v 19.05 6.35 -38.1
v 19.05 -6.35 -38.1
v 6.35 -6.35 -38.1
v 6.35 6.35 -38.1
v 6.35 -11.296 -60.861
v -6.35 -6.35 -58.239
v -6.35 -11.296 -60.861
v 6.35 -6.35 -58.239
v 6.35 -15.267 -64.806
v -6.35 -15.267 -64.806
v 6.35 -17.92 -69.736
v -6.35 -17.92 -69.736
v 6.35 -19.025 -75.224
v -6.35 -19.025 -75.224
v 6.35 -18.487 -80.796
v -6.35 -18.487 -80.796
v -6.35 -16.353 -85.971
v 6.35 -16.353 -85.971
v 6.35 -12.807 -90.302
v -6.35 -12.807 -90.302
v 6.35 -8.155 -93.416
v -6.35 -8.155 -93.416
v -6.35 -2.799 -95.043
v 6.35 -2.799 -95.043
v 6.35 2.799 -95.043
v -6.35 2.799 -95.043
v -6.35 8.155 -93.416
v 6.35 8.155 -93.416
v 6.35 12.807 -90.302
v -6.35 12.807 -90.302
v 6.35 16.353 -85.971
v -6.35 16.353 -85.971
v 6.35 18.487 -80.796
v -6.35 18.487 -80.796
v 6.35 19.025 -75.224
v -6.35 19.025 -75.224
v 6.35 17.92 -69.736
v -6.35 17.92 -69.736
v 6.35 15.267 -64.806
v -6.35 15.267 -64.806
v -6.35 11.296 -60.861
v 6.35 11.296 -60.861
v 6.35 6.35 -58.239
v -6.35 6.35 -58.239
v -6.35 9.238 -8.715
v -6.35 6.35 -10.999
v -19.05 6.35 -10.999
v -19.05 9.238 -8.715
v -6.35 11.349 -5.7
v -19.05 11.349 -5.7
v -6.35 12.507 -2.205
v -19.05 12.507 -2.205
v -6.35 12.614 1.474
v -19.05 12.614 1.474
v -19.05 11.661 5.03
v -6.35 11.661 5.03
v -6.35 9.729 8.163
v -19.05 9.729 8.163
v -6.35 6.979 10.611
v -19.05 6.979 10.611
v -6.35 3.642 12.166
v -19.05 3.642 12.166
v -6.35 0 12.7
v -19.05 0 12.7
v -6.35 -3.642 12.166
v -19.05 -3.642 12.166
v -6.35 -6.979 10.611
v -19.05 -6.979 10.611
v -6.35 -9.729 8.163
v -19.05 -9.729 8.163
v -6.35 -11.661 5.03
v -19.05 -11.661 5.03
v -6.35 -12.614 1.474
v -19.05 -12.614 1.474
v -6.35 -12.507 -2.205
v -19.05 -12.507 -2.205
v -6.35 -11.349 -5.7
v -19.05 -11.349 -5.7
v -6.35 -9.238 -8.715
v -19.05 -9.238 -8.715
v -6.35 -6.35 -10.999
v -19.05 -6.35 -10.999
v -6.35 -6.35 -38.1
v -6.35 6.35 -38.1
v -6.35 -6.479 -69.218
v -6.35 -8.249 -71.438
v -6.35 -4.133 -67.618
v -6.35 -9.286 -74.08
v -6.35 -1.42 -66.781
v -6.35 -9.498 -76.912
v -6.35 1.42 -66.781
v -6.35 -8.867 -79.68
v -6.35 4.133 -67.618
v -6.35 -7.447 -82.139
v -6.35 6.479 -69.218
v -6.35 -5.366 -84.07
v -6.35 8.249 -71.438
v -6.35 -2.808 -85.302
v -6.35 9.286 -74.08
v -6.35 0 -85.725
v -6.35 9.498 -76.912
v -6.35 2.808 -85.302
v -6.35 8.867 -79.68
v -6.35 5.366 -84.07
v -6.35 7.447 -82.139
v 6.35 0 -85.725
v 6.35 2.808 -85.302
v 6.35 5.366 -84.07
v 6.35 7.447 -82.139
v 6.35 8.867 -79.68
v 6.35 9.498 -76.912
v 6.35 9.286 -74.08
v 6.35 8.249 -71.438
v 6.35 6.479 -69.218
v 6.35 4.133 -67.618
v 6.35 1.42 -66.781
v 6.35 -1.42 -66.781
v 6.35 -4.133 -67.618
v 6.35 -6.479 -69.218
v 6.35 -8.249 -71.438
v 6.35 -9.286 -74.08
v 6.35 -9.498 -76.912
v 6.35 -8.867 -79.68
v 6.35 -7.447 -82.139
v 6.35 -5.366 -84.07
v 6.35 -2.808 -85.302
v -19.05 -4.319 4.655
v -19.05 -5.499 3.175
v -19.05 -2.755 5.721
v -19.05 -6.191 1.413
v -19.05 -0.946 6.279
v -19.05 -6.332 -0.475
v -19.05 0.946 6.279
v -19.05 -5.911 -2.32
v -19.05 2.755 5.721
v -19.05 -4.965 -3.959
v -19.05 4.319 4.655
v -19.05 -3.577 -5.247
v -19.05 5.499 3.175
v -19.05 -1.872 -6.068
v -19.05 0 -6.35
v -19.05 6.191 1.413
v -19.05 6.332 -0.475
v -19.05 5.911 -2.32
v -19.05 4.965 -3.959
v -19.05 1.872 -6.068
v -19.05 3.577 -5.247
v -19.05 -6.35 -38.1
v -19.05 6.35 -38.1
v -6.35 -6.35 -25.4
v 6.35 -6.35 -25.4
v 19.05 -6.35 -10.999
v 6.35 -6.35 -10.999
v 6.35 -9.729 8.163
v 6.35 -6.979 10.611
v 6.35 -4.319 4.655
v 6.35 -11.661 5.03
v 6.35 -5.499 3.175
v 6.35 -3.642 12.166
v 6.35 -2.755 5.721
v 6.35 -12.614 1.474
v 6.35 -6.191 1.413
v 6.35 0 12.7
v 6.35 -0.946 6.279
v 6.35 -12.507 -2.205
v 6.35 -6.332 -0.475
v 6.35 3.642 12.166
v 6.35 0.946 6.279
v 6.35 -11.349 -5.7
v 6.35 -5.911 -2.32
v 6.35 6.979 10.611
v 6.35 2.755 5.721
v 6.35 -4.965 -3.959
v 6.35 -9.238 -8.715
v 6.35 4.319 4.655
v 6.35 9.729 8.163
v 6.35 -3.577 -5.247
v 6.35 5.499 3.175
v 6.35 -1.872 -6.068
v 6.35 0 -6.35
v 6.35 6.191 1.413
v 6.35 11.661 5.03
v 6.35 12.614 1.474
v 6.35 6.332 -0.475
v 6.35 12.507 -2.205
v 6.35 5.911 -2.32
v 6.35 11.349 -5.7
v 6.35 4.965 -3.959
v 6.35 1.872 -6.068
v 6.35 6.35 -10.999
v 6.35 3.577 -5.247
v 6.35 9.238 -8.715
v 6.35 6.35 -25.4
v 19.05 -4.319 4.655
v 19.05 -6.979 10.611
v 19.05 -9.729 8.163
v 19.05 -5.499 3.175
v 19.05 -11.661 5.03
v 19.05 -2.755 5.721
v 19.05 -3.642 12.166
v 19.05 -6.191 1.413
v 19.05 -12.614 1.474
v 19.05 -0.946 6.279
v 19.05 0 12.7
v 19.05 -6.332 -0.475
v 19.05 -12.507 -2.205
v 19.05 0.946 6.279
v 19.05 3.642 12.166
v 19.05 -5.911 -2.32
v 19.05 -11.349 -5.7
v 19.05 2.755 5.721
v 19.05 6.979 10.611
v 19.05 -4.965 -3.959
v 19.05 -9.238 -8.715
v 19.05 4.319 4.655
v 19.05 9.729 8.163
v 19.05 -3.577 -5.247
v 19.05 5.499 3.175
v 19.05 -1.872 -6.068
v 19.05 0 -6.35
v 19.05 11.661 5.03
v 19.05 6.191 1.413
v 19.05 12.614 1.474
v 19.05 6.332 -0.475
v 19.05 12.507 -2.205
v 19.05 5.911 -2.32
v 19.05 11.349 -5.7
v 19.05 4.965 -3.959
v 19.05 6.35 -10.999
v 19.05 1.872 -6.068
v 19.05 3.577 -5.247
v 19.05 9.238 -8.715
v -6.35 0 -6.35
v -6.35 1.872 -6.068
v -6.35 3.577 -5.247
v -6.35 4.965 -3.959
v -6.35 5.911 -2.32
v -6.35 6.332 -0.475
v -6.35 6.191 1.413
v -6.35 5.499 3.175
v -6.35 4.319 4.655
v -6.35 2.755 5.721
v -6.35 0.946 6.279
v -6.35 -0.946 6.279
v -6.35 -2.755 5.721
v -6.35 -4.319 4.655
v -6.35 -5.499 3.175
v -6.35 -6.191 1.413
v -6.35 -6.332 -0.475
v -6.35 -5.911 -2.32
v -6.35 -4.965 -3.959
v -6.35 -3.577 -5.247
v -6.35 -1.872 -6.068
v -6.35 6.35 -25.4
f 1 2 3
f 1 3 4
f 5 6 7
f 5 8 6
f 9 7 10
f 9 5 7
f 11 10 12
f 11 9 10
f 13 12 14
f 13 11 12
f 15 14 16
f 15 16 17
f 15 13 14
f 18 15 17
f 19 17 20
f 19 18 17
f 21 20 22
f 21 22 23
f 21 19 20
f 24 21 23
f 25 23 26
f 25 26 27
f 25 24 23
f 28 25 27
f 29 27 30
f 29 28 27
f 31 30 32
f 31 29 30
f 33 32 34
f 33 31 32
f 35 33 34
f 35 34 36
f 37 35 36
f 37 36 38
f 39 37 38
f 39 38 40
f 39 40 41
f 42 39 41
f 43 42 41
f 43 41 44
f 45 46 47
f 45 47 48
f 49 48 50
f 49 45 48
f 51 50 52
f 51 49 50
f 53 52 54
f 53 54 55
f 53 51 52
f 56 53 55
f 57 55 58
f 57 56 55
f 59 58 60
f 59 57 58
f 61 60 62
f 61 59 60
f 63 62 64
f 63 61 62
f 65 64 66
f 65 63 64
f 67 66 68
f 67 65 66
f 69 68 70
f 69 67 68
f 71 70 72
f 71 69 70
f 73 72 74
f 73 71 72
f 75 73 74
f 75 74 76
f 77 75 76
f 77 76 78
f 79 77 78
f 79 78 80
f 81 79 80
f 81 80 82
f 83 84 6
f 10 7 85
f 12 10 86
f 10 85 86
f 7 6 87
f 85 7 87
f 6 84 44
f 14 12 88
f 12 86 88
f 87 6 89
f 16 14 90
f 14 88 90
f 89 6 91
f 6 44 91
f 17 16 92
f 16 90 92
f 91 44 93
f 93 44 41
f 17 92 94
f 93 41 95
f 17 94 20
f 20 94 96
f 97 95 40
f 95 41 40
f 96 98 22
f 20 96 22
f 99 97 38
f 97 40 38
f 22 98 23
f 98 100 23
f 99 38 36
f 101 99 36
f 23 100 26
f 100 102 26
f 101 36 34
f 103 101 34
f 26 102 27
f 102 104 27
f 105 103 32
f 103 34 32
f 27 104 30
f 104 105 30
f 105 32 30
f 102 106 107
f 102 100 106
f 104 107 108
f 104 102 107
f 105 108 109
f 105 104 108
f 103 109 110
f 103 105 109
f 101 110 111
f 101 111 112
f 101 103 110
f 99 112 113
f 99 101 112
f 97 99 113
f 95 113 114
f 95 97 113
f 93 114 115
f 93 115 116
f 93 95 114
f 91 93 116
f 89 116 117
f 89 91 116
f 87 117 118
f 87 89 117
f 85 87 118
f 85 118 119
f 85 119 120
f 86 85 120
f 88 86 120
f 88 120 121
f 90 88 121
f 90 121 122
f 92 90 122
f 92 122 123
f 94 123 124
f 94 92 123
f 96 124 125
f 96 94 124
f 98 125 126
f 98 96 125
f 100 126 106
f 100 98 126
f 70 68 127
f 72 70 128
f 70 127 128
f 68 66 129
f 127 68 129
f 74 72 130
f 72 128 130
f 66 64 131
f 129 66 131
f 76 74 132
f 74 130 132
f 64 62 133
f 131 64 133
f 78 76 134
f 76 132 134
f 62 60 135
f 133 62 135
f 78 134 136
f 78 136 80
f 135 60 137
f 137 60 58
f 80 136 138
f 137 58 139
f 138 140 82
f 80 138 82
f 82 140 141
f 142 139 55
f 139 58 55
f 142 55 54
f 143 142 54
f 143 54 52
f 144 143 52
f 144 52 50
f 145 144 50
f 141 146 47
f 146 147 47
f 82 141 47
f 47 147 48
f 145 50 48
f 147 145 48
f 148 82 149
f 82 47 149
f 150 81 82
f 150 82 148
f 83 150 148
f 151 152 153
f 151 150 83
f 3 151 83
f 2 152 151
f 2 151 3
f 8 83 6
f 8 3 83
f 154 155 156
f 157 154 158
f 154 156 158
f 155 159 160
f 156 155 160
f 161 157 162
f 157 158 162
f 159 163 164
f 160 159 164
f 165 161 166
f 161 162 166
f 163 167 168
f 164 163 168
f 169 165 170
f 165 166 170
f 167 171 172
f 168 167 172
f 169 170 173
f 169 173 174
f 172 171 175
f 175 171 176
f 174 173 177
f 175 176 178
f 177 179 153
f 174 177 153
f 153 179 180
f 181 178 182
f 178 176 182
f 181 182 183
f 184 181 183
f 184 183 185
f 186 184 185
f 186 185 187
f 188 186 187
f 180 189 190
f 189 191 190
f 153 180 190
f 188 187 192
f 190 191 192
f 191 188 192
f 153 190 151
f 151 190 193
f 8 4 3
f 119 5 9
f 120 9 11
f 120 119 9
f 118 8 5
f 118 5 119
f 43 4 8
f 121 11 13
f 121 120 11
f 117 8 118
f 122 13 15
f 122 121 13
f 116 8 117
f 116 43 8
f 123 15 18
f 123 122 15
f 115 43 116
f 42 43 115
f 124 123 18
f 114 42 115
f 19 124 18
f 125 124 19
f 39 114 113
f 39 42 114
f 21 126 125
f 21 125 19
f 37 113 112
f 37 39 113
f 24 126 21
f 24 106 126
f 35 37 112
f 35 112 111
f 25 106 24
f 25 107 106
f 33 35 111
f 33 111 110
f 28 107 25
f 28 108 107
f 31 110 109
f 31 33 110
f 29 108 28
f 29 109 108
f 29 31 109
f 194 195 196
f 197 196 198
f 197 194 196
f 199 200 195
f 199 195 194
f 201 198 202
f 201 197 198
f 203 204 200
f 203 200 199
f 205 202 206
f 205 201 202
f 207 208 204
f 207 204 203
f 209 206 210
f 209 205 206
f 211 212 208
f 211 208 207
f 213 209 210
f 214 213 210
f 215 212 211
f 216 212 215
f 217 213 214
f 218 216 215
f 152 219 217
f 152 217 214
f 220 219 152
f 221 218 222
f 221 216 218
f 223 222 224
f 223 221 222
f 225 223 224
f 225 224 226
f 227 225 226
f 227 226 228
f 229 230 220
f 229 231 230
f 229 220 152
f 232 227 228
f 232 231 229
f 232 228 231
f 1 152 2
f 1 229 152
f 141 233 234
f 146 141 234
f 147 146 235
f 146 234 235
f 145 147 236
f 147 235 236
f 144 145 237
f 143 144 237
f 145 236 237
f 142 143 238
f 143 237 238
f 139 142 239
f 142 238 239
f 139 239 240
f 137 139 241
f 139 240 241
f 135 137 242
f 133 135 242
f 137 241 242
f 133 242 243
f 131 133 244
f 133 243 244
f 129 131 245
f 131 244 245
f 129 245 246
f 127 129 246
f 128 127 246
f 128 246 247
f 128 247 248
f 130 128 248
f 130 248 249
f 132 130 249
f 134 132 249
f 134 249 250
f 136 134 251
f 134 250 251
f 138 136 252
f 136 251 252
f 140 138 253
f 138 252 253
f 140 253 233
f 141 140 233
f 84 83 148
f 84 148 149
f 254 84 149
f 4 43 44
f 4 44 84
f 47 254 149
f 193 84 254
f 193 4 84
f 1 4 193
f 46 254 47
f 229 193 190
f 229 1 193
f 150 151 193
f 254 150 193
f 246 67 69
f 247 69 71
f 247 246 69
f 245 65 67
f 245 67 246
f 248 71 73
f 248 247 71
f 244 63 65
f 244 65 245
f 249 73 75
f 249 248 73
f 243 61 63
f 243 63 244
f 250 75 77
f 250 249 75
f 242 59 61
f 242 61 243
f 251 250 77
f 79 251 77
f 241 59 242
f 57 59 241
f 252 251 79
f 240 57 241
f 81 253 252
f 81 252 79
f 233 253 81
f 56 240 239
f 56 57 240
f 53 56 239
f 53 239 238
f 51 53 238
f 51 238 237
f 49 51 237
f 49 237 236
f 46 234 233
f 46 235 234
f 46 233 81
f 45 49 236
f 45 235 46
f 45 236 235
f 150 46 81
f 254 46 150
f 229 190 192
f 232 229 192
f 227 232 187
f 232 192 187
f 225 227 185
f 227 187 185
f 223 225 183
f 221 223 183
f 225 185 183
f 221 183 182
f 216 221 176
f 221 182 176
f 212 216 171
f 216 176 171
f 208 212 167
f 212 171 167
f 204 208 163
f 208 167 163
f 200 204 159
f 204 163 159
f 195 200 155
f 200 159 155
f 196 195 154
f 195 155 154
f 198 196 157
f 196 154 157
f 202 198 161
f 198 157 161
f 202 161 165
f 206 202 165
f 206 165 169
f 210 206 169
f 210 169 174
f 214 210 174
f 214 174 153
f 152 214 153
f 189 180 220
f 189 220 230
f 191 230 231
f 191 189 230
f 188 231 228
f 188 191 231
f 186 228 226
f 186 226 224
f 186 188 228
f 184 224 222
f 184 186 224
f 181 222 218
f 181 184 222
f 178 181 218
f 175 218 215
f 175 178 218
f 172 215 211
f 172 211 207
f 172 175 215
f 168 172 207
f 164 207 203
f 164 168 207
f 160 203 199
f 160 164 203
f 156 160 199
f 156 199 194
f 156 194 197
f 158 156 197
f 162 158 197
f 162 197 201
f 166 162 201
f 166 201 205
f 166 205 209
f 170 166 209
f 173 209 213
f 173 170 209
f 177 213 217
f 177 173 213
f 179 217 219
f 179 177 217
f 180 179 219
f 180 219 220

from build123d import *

# Parameters (mm, degrees)
SKETCH1_R           = 9.525
BOSS_EXTRUDE1_DEPTH = 6.35
SKETCH1_3_W         = 12.7
SKETCH1_3_H         = 12.7
BOSS_EXTRUDE2_DEPTH = 19.05
BOSS_EXTRUDE3_START = 6.35
SKETCH1_4_R         = 6.35
BOSS_EXTRUDE3_DEPTH = 12.7


with BuildPart() as part:
    # Sketch1 → Boss-Extrude1 (new, symmetric)
    with BuildSketch(Plane(origin=(0, 0, 0), x_dir=(0, 0, -1), z_dir=(1, 0, 0))):
        with BuildLine():
            Line((38.1, 6.35), (38.1, -6.35))
            Line((38.1, -6.35), (58.239487758, -6.35))
            ThreePointArc((58.239487758, -6.35), (95.25, 0), (58.239487758, 6.35))
            Line((58.239487758, 6.35), (38.1, 6.35))
        make_face()
        with Locations((76.2, 0)):
            Circle(SKETCH1_R, mode=Mode.SUBTRACT)
    extrude(amount=BOSS_EXTRUDE1_DEPTH, both=True)

    # Sketch1<3> → Boss-Extrude2 (add, symmetric)
    with BuildSketch(Plane(origin=(0, 0, 0), x_dir=(0, 0, -1), z_dir=(1, 0, 0))):
        with Locations((31.75, 0)):
            Rectangle(SKETCH1_3_W, SKETCH1_3_H)
    extrude(amount=BOSS_EXTRUDE2_DEPTH, both=True)


with BuildPart() as body_2:
    # Sketch1<4> → Boss-Extrude3 (new body)
    with BuildSketch(Plane(origin=(0, 0, 0), x_dir=(0, 0, -1), z_dir=(1, 0, 0)).offset(BOSS_EXTRUDE3_START)):
        with BuildLine():
            Line((25.4, 6.35), (10.998522628, 6.35))
            ThreePointArc((10.998522628, 6.35), (-12.7, 0), (10.998522628, -6.35))
            Line((10.998522628, -6.35), (25.4, -6.35))
            Line((25.4, -6.35), (25.4, 6.35))
        make_face()
        Circle(SKETCH1_4_R, mode=Mode.SUBTRACT)
    boss_extrude3 = extrude(amount=BOSS_EXTRUDE3_DEPTH)


with BuildPart() as part_1:
    add(part.part)

    # Mirror2: Boss-Extrude3 across plane
    add(boss_extrude3.mirror(Plane(origin=(0, 0, 0), x_dir=(0, 0, 1), z_dir=(1, 0, 0))))


with BuildPart() as body_2_1:
    add(body_2.part)

    # Combine1: union part
    add(part_1.part)


solid = body_2_1.part
